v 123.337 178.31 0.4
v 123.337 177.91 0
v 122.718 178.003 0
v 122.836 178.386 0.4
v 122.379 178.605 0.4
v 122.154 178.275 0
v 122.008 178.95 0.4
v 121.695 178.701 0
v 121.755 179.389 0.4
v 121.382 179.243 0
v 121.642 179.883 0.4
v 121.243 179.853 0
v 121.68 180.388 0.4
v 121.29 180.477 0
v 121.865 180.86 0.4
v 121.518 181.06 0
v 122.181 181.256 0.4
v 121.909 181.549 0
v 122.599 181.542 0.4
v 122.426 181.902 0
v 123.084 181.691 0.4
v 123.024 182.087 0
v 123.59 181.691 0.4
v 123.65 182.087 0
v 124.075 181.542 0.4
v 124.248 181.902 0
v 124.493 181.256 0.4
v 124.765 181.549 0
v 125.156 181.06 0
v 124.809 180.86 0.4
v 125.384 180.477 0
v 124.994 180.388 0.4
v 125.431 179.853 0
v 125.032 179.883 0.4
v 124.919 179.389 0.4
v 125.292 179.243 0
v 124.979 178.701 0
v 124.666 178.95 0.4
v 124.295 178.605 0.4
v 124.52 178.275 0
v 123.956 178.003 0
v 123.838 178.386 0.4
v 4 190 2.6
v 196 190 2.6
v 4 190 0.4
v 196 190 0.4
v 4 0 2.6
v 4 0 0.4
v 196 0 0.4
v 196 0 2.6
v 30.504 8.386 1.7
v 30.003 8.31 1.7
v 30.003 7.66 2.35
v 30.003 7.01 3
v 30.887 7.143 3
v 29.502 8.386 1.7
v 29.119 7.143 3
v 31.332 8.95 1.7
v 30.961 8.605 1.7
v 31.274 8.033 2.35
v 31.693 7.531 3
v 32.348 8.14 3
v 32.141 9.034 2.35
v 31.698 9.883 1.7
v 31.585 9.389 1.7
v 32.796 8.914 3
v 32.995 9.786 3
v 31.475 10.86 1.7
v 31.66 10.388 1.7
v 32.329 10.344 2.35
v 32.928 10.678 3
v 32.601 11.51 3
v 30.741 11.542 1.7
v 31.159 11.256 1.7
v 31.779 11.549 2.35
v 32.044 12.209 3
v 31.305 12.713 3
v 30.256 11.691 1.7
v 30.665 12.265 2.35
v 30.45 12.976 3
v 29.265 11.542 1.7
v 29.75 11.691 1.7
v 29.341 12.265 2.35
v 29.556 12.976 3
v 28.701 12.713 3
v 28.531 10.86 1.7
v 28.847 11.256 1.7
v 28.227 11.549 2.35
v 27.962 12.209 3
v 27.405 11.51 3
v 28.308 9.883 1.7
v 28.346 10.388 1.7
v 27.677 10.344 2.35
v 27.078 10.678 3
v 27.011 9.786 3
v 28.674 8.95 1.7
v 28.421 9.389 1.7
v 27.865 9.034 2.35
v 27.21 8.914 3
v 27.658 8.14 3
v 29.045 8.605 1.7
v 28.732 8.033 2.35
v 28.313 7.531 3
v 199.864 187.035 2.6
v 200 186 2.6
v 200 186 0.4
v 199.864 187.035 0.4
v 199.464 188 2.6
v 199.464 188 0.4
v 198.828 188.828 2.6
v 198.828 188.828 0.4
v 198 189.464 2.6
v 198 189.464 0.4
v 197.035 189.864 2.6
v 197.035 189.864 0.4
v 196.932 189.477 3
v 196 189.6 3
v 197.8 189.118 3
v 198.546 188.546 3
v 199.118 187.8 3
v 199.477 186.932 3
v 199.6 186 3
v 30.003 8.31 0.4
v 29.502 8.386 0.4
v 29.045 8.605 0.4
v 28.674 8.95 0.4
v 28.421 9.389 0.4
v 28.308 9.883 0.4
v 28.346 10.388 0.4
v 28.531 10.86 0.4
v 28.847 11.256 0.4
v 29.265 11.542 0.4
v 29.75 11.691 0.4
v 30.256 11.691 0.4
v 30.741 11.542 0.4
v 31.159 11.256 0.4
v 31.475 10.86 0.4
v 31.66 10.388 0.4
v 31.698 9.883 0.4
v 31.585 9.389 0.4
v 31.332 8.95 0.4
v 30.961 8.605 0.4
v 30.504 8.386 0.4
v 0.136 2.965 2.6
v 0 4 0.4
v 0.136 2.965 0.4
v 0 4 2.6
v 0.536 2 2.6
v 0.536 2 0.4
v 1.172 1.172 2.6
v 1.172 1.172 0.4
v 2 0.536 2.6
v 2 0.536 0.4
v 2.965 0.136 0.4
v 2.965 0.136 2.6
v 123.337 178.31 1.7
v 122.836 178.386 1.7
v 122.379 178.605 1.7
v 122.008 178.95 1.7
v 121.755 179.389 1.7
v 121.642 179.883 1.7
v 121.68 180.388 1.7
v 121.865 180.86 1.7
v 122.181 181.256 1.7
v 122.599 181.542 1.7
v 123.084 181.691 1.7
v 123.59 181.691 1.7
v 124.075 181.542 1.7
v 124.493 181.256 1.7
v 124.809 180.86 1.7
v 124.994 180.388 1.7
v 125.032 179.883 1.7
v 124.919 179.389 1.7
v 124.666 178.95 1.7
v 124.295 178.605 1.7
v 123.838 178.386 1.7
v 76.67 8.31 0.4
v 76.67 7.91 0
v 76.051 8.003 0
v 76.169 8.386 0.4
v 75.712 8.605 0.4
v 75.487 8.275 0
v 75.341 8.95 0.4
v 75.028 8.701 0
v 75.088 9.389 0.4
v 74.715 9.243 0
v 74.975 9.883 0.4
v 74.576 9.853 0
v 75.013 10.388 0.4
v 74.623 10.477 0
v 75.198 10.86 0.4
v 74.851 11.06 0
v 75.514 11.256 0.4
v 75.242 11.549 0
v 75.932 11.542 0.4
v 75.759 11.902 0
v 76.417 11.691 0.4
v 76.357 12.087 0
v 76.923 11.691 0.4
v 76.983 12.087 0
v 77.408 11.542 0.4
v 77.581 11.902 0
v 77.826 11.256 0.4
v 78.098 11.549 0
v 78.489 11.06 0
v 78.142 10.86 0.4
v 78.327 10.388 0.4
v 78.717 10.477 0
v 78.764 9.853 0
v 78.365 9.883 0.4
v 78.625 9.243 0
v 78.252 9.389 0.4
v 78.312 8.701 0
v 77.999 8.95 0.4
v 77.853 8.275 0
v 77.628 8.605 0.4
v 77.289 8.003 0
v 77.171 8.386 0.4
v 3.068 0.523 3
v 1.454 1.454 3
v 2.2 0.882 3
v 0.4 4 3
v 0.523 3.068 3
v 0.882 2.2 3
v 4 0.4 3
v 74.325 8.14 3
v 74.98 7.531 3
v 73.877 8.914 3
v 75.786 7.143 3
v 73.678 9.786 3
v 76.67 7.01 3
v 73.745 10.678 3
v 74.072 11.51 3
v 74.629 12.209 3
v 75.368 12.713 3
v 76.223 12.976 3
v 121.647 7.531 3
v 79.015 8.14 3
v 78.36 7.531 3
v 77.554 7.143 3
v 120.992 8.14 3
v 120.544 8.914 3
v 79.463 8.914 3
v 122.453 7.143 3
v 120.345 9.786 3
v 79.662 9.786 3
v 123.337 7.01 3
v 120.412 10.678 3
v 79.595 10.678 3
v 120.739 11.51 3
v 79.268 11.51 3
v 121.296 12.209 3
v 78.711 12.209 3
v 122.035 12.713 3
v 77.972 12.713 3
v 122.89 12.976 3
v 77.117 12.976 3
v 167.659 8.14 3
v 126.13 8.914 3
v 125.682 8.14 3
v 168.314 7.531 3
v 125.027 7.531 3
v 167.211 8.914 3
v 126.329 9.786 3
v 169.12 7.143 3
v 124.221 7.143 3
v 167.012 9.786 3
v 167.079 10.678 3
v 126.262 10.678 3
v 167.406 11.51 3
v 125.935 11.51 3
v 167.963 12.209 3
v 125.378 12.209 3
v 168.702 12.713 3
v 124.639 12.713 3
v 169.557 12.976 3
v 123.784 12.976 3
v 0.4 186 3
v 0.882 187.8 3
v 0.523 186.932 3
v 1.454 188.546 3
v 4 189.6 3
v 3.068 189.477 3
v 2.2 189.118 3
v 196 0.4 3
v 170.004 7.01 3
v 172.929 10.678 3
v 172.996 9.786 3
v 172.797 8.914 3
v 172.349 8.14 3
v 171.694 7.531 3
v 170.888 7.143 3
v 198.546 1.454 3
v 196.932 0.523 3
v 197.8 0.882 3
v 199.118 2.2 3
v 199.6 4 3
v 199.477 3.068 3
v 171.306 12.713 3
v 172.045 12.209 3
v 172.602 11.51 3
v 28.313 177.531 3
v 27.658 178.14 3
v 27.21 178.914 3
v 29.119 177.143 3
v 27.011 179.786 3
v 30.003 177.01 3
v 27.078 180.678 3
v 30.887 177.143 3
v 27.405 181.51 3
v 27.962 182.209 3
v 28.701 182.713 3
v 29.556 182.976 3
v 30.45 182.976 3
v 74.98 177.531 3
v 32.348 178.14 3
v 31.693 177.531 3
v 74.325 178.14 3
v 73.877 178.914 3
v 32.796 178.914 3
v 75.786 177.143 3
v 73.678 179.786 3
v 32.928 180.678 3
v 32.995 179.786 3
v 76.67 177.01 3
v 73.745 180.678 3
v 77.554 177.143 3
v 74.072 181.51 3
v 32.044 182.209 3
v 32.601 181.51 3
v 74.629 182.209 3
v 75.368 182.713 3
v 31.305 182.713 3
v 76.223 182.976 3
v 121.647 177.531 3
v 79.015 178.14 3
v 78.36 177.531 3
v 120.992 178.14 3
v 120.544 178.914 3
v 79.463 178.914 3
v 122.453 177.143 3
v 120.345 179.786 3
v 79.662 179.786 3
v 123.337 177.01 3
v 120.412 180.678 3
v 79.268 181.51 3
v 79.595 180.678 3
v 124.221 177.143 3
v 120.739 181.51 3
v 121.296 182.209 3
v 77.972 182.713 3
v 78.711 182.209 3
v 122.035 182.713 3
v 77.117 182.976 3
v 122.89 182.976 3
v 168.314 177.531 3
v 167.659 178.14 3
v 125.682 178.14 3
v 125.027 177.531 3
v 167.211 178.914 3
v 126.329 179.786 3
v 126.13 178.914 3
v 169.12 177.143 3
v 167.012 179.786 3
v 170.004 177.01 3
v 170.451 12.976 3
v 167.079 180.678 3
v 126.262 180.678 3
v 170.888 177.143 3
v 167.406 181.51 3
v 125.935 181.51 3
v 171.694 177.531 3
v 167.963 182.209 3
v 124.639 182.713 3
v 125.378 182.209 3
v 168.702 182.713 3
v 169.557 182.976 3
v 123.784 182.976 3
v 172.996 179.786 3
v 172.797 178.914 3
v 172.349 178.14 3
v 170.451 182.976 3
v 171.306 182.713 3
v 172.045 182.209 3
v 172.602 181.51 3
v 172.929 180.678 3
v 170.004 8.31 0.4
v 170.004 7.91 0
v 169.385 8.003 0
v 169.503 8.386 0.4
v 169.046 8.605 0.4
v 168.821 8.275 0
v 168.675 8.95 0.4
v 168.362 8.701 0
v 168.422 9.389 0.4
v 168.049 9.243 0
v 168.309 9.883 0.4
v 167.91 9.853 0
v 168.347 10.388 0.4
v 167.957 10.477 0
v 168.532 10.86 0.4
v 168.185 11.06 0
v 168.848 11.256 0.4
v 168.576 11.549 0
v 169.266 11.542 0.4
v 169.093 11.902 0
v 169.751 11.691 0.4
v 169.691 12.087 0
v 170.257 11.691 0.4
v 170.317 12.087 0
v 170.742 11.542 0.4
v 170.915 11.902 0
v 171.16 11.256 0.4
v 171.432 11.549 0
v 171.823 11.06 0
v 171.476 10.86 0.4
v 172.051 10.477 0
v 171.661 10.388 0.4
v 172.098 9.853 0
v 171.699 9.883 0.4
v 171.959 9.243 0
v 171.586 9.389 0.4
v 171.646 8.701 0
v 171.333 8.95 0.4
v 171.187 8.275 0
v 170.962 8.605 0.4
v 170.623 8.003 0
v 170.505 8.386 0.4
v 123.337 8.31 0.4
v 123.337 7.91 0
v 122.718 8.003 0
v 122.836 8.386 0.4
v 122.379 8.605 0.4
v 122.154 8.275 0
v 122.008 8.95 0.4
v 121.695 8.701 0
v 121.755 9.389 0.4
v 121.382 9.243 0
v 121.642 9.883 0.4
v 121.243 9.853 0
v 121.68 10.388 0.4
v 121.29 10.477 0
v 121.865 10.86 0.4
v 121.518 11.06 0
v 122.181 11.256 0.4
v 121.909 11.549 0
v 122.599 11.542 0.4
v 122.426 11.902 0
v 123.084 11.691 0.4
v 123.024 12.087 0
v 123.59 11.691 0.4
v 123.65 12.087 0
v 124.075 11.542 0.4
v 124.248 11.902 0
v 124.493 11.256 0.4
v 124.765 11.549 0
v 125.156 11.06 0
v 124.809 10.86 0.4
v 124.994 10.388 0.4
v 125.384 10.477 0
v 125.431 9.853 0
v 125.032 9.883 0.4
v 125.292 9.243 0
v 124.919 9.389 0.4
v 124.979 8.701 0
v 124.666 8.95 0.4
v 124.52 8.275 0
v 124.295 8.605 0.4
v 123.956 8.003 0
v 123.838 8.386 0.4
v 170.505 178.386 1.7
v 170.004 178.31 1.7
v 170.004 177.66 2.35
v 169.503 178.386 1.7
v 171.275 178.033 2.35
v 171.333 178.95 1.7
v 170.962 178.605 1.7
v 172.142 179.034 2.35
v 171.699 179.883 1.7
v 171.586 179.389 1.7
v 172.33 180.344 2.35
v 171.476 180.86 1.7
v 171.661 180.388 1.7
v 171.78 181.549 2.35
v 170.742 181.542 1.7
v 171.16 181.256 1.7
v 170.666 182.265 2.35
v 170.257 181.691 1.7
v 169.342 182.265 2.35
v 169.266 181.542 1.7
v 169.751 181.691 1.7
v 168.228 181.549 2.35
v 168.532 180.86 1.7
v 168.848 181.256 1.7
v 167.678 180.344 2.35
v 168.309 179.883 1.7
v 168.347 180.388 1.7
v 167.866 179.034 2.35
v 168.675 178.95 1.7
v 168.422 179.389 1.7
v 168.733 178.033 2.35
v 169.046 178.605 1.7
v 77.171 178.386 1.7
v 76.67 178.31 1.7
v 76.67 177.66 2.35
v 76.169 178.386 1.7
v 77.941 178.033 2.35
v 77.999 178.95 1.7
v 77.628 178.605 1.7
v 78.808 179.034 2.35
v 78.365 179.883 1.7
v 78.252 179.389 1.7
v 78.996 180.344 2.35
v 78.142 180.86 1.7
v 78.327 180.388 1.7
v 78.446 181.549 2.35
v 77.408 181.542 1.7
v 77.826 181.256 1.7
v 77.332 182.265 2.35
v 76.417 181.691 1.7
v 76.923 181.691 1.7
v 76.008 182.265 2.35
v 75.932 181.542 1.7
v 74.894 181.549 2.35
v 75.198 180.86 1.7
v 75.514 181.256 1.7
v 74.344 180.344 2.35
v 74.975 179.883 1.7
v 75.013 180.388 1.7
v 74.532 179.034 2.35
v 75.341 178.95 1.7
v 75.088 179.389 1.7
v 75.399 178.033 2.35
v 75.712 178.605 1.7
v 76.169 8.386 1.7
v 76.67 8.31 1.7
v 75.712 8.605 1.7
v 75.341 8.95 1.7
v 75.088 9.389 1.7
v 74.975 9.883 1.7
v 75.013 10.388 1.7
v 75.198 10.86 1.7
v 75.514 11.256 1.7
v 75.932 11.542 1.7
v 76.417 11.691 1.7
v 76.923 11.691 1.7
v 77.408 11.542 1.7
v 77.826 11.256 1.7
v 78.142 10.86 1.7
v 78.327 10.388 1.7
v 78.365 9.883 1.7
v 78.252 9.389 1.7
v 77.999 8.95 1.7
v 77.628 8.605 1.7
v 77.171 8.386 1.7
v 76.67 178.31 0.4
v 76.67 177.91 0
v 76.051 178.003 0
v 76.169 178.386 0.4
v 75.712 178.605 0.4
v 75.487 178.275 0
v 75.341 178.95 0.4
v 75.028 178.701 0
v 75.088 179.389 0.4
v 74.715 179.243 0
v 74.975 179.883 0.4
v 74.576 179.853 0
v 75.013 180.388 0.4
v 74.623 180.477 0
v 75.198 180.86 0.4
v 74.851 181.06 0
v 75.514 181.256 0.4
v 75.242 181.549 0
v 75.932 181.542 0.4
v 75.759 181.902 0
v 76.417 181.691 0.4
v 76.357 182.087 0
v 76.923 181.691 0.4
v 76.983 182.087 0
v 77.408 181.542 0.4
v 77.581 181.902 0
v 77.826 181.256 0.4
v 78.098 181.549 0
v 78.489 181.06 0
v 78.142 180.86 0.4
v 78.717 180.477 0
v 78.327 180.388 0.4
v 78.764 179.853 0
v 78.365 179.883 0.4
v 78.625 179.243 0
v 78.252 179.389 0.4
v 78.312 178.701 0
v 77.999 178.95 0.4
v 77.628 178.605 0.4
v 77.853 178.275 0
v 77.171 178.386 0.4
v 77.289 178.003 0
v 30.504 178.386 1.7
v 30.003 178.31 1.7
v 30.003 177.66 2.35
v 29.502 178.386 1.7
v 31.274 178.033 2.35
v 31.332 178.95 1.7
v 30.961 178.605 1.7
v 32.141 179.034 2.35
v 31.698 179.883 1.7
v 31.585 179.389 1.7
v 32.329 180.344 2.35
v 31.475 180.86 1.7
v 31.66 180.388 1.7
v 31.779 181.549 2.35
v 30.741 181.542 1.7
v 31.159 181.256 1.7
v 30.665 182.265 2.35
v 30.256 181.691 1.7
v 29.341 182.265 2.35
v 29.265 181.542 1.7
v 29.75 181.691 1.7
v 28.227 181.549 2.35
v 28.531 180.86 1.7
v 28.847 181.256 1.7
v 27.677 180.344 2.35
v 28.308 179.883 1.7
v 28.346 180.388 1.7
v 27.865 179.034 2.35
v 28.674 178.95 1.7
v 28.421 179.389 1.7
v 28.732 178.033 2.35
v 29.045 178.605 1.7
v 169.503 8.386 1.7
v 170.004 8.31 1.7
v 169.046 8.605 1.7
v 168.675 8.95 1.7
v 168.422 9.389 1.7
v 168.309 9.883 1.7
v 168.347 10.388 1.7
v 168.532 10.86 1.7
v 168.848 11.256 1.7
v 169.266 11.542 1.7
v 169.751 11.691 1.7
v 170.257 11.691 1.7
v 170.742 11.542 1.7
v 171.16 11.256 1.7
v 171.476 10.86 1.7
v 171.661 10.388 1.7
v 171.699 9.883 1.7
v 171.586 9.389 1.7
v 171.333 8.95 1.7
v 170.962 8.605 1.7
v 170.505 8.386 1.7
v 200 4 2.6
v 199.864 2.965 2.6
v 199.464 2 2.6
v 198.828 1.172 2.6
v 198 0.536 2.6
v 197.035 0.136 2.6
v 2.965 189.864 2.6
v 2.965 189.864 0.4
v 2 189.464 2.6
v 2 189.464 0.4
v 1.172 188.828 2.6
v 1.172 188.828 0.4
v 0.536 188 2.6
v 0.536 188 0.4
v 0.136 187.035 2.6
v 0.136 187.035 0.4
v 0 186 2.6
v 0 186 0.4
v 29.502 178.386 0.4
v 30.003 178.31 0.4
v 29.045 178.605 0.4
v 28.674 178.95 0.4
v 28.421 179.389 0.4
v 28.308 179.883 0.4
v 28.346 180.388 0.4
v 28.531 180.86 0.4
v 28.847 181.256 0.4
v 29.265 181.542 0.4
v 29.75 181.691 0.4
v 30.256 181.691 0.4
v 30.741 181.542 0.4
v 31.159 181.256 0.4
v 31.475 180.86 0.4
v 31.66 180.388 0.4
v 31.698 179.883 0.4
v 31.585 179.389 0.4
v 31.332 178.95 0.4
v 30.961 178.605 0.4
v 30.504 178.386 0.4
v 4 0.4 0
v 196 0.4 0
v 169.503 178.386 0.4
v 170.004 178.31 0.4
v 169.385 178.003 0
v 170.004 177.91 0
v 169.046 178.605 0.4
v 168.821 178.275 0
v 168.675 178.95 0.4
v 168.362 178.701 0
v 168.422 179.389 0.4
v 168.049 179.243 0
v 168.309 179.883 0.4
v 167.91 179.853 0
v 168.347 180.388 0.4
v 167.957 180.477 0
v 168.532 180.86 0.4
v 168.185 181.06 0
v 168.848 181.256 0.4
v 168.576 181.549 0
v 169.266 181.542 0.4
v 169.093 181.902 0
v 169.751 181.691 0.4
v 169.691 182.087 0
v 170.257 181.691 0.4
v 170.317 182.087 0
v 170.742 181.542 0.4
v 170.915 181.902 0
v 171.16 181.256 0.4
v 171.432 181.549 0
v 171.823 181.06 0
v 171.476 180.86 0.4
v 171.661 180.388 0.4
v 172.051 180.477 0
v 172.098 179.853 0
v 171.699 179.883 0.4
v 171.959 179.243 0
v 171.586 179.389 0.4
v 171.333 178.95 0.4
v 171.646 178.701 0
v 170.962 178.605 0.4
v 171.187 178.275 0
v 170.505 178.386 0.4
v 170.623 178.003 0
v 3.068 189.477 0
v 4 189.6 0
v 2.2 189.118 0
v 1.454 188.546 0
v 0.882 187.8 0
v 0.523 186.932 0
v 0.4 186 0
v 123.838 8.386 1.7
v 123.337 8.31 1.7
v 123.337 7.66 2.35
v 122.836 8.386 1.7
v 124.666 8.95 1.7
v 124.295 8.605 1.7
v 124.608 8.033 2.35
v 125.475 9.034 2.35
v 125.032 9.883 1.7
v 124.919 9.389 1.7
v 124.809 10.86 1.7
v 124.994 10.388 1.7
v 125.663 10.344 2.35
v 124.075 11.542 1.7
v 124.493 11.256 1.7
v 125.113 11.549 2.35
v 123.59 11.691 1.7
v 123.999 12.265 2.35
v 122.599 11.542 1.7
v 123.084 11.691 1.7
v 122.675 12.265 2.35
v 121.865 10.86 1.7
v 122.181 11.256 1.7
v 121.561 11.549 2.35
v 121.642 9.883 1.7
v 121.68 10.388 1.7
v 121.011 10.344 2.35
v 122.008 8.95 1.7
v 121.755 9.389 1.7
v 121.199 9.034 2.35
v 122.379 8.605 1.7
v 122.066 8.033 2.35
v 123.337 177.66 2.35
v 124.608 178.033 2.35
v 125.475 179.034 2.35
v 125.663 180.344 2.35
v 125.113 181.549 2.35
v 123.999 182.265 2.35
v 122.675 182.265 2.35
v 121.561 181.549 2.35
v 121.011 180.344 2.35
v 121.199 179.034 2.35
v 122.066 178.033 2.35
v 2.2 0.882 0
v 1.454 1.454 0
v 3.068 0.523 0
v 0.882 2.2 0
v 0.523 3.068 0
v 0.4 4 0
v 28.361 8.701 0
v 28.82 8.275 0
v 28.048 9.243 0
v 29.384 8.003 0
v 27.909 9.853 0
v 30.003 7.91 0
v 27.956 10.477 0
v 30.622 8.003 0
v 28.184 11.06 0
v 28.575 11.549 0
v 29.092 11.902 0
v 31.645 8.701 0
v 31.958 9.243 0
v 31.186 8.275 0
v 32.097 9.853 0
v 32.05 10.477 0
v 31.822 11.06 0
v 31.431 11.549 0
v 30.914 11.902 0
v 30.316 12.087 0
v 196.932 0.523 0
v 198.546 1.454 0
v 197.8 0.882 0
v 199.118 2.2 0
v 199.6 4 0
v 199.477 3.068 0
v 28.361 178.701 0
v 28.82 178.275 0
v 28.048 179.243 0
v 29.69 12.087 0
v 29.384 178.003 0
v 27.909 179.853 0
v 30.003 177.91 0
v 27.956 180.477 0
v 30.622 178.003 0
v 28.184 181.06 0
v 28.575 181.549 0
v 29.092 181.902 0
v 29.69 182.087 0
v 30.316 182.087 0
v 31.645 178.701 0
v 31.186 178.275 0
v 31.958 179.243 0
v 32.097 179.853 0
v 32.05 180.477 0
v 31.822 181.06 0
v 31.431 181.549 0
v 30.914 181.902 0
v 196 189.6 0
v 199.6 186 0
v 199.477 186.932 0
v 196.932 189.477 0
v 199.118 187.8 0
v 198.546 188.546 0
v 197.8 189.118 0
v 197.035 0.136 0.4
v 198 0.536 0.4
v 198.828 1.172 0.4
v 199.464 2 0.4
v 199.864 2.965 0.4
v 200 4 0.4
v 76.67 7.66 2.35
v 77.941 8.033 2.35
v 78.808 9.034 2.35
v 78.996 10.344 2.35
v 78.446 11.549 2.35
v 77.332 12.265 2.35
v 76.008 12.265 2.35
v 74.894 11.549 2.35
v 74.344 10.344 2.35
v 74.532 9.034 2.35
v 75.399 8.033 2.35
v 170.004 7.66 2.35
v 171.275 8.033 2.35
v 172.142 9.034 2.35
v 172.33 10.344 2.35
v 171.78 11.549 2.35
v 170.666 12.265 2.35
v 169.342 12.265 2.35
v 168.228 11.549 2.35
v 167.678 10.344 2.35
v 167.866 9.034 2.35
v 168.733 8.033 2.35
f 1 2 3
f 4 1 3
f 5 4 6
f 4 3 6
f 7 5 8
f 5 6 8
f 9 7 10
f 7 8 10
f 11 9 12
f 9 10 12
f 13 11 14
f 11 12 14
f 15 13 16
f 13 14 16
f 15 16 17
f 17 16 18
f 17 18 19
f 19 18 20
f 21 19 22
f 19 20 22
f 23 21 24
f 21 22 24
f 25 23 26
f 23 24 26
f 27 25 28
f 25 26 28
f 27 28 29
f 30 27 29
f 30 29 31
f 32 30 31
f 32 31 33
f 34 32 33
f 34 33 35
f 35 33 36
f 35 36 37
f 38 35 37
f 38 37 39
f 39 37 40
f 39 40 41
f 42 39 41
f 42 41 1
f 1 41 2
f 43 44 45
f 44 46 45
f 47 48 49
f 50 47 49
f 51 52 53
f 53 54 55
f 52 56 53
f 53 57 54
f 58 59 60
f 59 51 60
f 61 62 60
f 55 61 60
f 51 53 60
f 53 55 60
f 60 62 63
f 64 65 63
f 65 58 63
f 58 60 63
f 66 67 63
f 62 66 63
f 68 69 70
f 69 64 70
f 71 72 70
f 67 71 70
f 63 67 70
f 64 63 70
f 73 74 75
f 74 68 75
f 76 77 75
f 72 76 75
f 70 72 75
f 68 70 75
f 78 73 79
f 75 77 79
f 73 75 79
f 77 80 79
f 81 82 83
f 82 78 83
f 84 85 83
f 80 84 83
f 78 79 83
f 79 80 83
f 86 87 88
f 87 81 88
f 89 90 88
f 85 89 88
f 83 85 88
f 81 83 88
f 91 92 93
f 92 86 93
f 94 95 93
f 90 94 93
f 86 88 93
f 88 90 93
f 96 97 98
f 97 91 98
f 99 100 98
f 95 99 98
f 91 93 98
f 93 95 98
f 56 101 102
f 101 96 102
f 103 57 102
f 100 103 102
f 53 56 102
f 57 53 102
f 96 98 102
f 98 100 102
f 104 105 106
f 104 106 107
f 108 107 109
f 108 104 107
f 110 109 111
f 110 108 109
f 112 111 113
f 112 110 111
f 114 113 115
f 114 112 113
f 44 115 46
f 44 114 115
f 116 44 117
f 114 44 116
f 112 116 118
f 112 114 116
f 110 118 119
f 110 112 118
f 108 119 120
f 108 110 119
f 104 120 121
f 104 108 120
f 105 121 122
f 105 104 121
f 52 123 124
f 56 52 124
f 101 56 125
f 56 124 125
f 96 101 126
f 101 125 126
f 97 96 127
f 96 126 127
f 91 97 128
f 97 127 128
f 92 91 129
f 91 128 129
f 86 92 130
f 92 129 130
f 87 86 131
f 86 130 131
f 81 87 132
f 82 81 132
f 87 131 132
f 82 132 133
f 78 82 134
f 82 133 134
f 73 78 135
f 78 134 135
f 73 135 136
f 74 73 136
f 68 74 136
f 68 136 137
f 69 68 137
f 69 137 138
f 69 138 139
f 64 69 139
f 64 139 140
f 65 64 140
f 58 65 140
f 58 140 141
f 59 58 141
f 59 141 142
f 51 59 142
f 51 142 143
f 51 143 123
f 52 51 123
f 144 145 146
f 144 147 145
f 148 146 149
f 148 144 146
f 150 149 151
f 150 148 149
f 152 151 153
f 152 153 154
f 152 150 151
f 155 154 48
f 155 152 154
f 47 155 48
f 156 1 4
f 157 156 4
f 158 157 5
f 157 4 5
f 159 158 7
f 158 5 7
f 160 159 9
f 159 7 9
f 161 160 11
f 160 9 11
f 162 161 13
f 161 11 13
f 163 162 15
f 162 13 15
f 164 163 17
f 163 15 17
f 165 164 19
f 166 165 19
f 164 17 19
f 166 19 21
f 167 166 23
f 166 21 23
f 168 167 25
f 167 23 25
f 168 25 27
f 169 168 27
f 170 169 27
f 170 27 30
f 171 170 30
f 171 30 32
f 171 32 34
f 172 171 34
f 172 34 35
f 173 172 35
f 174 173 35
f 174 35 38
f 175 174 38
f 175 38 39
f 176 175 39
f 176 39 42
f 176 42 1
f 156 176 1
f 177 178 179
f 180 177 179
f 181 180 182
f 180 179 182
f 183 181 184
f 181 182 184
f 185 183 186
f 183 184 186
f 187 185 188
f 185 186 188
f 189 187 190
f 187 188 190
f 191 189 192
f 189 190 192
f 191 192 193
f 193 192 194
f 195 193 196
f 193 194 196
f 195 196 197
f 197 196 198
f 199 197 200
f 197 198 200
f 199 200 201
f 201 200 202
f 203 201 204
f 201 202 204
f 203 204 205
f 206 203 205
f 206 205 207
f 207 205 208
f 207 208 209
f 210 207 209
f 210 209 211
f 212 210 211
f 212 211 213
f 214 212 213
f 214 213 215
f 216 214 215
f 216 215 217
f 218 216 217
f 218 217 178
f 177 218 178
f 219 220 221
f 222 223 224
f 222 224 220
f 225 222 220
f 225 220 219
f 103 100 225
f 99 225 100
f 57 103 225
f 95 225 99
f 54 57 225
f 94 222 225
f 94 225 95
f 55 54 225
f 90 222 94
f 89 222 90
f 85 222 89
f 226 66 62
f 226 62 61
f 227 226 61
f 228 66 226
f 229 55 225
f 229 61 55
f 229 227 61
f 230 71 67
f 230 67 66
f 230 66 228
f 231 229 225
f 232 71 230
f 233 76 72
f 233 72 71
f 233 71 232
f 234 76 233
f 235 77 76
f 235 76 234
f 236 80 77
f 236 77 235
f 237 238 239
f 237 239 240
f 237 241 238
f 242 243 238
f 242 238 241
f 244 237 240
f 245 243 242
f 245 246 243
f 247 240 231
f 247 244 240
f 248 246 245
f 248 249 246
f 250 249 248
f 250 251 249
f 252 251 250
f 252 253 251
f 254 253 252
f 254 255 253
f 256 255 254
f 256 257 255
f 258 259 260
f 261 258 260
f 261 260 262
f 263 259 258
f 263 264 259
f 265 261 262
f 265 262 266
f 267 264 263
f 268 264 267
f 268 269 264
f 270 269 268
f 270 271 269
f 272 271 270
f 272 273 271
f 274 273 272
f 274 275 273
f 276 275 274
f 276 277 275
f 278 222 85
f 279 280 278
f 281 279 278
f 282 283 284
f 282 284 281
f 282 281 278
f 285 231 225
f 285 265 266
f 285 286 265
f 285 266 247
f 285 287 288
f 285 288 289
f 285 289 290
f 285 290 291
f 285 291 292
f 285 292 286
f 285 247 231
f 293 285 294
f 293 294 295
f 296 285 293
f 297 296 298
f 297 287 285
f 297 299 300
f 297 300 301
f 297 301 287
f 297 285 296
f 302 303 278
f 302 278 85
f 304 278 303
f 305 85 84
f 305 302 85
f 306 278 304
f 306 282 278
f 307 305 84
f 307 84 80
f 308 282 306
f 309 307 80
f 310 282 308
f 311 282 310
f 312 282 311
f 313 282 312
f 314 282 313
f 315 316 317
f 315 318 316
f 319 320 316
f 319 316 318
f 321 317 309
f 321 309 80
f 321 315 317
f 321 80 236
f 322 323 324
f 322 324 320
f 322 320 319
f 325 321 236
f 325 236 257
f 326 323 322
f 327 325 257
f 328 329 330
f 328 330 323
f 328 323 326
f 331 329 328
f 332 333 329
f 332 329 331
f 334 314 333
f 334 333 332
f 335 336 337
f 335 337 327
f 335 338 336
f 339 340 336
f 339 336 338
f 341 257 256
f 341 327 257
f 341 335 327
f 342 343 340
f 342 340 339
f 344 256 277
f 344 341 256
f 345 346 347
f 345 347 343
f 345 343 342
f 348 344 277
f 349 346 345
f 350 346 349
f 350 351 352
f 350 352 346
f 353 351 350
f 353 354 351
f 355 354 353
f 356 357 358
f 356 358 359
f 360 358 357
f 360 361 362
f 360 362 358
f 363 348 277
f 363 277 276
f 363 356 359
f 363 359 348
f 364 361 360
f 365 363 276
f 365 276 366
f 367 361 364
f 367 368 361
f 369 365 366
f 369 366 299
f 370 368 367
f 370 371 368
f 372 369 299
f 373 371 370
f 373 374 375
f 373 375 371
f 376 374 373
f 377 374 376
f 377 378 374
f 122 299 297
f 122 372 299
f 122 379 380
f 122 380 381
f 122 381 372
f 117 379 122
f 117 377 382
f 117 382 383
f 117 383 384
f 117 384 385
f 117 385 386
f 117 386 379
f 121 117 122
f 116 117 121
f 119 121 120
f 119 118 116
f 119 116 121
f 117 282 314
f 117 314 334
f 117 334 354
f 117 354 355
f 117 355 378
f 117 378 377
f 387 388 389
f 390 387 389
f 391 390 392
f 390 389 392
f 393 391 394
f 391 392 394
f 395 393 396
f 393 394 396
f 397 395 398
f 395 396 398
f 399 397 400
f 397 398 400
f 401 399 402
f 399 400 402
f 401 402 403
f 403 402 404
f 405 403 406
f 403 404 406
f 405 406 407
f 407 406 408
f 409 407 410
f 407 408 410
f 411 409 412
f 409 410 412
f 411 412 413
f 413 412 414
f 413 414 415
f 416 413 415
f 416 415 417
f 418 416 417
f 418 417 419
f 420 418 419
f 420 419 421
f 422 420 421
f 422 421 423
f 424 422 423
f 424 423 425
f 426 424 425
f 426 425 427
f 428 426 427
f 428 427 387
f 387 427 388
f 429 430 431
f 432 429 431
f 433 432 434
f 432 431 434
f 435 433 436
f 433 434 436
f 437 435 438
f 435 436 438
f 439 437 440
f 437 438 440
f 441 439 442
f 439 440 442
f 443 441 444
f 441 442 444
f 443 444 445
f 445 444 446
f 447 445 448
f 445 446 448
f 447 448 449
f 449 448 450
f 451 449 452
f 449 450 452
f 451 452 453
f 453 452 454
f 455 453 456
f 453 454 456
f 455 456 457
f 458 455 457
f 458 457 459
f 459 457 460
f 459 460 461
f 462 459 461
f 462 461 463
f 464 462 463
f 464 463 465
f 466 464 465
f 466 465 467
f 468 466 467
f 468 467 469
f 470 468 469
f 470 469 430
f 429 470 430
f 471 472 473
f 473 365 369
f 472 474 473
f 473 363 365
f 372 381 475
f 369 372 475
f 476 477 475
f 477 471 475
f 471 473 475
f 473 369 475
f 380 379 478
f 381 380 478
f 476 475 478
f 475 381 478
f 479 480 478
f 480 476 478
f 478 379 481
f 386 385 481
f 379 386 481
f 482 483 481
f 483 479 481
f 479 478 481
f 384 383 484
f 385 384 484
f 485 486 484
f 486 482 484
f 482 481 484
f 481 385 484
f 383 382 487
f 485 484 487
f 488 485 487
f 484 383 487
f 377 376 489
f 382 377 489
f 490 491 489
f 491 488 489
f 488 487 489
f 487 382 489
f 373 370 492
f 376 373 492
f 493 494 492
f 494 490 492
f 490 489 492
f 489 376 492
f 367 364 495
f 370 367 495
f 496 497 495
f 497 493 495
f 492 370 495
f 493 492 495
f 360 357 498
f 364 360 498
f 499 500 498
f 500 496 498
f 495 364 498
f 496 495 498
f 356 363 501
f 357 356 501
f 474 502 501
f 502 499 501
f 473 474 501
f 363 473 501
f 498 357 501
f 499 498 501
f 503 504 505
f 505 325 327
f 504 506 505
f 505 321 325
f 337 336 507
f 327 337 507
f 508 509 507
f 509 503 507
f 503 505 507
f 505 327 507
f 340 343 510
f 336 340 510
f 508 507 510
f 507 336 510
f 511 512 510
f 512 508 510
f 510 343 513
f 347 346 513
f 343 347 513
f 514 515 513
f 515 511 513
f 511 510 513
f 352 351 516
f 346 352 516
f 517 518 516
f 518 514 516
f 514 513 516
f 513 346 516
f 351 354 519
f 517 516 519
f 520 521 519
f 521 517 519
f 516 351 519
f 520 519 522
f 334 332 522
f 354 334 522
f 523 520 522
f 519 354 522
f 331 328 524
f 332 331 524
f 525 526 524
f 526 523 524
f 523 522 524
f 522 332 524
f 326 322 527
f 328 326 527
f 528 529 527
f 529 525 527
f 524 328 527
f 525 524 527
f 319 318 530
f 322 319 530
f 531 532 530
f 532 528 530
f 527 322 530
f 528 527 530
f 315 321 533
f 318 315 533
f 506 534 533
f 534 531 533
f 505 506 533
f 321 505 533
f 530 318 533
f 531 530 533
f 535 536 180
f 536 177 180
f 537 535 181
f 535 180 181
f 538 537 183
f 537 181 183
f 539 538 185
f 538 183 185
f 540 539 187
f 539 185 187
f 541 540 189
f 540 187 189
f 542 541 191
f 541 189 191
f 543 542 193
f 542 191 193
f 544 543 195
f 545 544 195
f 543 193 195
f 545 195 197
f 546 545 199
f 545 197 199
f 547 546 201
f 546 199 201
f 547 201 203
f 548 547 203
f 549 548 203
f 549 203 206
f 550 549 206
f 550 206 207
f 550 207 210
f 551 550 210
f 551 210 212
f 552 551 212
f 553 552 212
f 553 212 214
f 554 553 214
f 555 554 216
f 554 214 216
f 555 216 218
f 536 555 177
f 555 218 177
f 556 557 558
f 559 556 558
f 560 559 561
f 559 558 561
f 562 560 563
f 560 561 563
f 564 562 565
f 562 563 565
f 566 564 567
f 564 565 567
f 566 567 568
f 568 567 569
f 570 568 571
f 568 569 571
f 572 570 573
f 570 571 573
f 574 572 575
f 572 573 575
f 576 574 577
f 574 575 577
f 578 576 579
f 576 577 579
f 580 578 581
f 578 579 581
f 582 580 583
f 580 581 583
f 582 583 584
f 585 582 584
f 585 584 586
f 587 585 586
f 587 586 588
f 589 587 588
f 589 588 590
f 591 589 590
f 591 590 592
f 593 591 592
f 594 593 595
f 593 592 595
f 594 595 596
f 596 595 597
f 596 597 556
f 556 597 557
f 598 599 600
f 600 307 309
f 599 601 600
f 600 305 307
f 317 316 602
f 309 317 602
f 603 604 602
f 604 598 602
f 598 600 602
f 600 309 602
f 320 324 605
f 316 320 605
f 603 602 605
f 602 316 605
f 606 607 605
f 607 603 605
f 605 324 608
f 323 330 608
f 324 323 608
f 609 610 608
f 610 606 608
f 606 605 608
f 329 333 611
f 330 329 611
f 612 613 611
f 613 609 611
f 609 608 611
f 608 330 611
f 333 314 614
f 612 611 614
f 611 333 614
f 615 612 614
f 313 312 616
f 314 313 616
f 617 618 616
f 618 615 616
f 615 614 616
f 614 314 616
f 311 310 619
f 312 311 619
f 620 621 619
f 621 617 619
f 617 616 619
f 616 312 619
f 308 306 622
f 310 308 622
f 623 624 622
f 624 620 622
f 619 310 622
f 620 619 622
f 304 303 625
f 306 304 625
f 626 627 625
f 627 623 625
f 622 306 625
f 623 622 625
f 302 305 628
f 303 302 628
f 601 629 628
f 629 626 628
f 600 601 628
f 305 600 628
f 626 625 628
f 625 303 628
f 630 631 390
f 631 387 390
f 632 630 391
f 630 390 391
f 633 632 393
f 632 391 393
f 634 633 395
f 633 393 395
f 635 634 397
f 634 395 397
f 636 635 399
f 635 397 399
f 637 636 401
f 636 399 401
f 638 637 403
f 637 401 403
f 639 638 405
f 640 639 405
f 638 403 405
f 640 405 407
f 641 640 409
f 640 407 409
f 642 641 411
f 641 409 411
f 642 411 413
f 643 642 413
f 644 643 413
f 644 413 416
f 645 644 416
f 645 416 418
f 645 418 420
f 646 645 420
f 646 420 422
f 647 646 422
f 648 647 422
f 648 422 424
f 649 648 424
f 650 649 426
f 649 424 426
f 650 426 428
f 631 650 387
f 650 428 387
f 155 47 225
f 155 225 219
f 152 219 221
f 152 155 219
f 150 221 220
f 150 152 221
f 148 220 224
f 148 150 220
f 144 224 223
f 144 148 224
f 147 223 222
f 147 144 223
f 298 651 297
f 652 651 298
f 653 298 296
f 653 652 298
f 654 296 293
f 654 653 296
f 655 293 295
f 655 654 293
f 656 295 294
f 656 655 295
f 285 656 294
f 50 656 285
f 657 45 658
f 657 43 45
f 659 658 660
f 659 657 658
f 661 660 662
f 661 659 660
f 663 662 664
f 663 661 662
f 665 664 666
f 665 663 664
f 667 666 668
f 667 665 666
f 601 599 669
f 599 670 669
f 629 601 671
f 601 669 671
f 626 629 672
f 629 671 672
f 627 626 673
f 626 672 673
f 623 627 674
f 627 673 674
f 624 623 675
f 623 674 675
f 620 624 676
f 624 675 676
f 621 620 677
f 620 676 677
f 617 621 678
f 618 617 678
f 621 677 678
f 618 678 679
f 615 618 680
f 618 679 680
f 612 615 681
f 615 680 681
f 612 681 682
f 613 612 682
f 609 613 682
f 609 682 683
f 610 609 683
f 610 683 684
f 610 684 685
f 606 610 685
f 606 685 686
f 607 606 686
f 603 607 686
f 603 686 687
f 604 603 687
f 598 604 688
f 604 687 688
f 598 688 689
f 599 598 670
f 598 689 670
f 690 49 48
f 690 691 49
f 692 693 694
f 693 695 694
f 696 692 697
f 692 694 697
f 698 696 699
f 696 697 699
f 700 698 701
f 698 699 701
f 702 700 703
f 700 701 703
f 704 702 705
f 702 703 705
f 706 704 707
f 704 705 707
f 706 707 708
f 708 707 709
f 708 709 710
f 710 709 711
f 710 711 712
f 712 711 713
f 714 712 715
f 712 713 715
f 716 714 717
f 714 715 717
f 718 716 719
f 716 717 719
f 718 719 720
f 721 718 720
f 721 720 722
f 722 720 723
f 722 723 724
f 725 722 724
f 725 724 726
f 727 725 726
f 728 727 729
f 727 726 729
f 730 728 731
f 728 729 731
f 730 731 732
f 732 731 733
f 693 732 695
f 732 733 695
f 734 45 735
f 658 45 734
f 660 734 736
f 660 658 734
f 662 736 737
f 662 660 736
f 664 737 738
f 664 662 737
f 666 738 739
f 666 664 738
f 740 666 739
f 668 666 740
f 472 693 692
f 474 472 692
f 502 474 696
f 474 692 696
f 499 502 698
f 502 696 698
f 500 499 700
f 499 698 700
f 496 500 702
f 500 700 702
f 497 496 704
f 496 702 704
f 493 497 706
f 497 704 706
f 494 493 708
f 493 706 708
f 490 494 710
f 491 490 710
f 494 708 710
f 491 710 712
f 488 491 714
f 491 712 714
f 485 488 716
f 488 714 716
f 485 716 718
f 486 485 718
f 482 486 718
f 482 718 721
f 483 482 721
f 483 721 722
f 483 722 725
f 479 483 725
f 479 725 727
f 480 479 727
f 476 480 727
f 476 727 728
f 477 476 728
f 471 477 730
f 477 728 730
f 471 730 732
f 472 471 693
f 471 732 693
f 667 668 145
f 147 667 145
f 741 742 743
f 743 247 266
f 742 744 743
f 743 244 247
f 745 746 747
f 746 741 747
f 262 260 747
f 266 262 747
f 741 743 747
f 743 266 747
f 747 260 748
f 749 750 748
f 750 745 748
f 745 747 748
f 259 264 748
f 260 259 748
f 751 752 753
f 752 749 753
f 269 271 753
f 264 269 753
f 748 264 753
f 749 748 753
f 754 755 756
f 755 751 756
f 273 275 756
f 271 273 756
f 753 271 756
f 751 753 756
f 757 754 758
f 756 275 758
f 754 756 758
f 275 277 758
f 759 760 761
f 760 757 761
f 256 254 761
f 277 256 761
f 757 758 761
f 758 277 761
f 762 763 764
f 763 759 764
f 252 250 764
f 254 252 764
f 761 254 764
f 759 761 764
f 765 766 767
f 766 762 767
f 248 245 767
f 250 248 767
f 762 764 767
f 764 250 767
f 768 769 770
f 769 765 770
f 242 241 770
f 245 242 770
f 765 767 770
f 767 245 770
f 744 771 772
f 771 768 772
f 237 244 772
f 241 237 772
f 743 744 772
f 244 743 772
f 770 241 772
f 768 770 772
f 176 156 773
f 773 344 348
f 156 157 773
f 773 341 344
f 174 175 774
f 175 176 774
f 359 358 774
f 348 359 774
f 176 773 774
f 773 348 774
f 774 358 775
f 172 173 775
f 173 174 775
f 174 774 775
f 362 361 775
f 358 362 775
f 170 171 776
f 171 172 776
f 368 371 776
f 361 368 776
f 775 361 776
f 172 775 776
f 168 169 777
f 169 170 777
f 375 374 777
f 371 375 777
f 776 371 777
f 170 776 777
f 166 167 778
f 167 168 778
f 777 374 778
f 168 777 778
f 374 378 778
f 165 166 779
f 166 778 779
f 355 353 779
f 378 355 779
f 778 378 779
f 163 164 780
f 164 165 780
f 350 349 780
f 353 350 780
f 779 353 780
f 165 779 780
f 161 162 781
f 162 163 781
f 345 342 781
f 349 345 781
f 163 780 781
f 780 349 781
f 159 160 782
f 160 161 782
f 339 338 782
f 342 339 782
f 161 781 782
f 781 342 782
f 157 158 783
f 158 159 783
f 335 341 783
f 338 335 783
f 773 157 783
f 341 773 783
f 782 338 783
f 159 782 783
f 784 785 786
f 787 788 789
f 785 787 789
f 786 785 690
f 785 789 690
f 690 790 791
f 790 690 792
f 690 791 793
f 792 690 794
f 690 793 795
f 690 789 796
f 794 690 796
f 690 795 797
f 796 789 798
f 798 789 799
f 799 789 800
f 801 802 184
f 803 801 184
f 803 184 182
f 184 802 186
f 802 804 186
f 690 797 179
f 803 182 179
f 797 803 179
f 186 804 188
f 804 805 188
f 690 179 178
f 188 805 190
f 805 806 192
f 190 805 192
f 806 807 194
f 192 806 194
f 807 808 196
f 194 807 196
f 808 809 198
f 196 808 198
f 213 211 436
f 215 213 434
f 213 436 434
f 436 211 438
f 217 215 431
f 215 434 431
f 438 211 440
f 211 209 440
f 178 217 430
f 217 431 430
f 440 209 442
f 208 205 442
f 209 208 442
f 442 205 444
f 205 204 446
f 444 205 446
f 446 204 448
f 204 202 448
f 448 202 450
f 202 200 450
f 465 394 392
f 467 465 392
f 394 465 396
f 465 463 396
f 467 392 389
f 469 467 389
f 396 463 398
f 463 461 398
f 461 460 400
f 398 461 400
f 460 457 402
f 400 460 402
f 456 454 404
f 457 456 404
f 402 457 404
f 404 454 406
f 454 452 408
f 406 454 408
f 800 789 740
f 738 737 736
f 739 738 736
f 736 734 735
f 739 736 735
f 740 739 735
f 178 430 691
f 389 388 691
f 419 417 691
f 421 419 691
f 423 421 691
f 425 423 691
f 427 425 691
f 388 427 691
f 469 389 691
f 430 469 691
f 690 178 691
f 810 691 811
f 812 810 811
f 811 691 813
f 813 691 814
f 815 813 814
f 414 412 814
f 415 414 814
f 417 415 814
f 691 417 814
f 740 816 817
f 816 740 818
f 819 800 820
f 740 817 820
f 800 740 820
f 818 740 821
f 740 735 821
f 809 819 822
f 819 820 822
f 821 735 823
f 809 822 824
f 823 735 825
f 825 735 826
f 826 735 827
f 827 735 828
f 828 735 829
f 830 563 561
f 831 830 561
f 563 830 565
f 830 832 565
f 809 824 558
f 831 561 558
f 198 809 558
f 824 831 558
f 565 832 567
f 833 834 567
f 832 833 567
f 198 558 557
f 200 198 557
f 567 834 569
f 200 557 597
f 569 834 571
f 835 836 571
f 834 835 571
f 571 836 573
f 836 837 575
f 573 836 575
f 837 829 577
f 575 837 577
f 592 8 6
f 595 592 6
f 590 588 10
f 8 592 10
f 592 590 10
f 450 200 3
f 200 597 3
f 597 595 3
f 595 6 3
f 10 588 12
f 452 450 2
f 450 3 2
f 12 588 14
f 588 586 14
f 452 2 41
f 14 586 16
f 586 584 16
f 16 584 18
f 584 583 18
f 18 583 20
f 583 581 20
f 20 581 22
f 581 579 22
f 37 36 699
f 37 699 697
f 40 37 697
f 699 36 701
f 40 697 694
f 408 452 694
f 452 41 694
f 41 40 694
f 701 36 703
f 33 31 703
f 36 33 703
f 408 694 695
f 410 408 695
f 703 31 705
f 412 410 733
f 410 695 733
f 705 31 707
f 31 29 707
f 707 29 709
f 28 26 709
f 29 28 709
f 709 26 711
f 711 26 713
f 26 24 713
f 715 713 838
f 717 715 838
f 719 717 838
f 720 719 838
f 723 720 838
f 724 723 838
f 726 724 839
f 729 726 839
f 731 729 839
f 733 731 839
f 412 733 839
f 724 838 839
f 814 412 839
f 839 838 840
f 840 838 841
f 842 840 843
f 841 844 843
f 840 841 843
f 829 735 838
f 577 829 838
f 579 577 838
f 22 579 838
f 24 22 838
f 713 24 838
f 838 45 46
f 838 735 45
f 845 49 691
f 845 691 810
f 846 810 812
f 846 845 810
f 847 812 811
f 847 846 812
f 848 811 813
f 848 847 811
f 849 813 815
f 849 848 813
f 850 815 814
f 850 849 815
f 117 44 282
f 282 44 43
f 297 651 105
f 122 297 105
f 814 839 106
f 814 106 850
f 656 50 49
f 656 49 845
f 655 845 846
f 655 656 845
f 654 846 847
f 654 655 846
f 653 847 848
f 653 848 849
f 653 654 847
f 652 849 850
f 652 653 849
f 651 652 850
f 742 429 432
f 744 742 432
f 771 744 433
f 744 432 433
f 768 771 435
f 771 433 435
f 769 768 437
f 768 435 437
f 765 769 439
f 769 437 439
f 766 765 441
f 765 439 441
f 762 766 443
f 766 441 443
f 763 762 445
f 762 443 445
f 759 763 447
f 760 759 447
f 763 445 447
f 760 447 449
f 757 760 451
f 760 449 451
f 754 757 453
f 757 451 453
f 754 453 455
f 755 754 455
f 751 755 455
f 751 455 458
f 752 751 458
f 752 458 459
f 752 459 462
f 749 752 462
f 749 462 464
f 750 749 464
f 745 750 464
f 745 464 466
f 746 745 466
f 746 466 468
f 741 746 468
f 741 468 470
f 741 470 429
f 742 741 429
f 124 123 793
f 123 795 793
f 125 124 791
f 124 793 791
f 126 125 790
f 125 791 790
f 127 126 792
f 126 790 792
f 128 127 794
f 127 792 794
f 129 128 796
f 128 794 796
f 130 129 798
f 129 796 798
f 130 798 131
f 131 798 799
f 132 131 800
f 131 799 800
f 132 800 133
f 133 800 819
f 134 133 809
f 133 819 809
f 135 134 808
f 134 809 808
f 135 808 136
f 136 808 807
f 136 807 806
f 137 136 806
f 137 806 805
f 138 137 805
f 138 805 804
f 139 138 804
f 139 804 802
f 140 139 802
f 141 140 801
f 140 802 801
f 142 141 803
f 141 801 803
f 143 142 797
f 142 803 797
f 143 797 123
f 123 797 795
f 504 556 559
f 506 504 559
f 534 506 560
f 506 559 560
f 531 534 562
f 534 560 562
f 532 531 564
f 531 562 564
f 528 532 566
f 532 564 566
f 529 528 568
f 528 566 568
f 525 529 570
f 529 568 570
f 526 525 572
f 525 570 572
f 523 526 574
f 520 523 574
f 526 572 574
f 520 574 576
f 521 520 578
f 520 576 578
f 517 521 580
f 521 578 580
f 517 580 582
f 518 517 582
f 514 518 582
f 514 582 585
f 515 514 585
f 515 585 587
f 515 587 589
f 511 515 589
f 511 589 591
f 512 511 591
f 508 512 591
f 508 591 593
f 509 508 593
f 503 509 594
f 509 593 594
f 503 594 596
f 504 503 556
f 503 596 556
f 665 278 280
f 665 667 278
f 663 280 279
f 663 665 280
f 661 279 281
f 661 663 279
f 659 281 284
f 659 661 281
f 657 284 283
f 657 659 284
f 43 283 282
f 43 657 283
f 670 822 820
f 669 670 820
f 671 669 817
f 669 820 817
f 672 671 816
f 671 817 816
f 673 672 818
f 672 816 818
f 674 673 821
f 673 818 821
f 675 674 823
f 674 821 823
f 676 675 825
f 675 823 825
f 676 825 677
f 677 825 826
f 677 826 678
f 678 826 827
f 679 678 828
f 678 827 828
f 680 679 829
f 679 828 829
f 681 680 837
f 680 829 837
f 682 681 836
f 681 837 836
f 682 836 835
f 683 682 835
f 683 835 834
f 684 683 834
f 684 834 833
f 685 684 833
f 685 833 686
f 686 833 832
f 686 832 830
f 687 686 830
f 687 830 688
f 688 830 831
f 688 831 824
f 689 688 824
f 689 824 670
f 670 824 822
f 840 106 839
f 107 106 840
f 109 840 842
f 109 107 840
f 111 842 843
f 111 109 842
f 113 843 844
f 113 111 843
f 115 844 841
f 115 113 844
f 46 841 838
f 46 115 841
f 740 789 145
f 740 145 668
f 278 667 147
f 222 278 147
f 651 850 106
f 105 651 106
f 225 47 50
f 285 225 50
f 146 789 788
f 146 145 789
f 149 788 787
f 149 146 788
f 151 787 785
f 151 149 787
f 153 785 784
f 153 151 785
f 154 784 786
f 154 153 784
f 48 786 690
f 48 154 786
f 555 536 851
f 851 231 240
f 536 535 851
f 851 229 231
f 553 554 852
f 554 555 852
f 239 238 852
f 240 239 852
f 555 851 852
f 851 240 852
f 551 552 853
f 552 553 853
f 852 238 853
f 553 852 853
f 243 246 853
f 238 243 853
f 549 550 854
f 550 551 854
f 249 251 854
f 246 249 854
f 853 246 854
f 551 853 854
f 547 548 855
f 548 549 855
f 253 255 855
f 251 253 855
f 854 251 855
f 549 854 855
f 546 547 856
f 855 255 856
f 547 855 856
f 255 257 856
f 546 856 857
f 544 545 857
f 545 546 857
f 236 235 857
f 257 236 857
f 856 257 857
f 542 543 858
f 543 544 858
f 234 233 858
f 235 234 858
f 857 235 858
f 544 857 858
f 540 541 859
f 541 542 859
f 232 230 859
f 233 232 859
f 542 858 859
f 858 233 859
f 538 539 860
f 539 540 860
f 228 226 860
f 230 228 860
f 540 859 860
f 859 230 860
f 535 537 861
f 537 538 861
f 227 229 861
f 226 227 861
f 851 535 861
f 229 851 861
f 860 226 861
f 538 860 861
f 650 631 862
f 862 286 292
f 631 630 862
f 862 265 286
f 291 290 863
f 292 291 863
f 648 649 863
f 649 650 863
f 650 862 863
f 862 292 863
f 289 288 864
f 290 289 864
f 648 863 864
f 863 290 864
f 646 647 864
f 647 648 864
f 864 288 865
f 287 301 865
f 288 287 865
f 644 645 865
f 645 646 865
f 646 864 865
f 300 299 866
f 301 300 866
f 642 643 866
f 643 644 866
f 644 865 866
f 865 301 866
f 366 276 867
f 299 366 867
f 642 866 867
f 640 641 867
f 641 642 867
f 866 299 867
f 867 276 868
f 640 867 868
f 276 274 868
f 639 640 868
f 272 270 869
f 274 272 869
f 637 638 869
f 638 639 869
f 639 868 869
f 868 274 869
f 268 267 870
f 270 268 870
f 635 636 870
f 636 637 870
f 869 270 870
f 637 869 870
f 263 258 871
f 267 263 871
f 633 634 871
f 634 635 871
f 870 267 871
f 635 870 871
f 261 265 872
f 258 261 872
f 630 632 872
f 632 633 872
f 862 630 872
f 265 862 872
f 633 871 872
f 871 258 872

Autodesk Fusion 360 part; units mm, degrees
sketch "Sketch1" plane through (0, 0, 0) normal (0, 0, 1) x (1, 0, 0)
  line L0 (0, 0) -> (200, 0)
  line L1 (200, 0) -> (200, 190)
  line L2 (200, 190) -> (0, 190)
  line L3 (0, 190) -> (0, 0)
  dimension "d1" = 200
  dimension "d2" = 190
extrude "Extrude1" add sketch "Sketch1" along normal blind 3
sketch "Sketch2" plane through (0, 0, 3) normal (0, 0, 1) x (-1, 0, 0)
  line L0 (0, -190) -> (0, 0)
  line L1 (0, 0) -> (-200, 0)
  line L2 (-200, 0) -> (-200, -190)
  line L3 (-200, -190) -> (0, -190)
  point P0 (-30.003, -10.01)
  point P1 (-76.67, -10.01)
  point P2 (-123.337, -10.01)
  point P3 (-170.004, -10.01)
  point P4 (-30.003, -180.01)
  point P5 (-76.67, -180.01)
  point P6 (-123.337, -180.01)
  point P7 (-170.004, -180.01)
  dimension "d5" = 30.003
  dimension "d6" = 10.01
  dimension "d9" = 46.667
  dimension "d10" = 170
hole "Hole1" at (30.003, 10.01, 3) at (76.67, 10.01, 3) at (123.337, 10.01, 3) at (170.004, 10.01, 3) at (170.004, 180.01, 3) at (123.337, 180.01, 3) at (76.67, 180.01, 3) at (30.003, 180.01, 3) direction (0, 0, -1) diameter 3.4 end through all countersink diameter 6 countersink angle 90
fillet "Fillet2" radius 4 4 edges at (0, 190, 1.5) (200, 190, 1.5) (200, 0, 1.5) (0, 0, 1.5)
chamfer "Chamfer1" distance 0.4 angle 45 4 edges at (100, 0, 3) (0, 95, 3) (100, 190, 3) (200, 95, 3) 1 faces at (139.0678, 122.8044, 0)
equation "d5 = 28.303 mm + 1.7 mm"
equation "d6 = 8.310 mm + 1.7 mm"
